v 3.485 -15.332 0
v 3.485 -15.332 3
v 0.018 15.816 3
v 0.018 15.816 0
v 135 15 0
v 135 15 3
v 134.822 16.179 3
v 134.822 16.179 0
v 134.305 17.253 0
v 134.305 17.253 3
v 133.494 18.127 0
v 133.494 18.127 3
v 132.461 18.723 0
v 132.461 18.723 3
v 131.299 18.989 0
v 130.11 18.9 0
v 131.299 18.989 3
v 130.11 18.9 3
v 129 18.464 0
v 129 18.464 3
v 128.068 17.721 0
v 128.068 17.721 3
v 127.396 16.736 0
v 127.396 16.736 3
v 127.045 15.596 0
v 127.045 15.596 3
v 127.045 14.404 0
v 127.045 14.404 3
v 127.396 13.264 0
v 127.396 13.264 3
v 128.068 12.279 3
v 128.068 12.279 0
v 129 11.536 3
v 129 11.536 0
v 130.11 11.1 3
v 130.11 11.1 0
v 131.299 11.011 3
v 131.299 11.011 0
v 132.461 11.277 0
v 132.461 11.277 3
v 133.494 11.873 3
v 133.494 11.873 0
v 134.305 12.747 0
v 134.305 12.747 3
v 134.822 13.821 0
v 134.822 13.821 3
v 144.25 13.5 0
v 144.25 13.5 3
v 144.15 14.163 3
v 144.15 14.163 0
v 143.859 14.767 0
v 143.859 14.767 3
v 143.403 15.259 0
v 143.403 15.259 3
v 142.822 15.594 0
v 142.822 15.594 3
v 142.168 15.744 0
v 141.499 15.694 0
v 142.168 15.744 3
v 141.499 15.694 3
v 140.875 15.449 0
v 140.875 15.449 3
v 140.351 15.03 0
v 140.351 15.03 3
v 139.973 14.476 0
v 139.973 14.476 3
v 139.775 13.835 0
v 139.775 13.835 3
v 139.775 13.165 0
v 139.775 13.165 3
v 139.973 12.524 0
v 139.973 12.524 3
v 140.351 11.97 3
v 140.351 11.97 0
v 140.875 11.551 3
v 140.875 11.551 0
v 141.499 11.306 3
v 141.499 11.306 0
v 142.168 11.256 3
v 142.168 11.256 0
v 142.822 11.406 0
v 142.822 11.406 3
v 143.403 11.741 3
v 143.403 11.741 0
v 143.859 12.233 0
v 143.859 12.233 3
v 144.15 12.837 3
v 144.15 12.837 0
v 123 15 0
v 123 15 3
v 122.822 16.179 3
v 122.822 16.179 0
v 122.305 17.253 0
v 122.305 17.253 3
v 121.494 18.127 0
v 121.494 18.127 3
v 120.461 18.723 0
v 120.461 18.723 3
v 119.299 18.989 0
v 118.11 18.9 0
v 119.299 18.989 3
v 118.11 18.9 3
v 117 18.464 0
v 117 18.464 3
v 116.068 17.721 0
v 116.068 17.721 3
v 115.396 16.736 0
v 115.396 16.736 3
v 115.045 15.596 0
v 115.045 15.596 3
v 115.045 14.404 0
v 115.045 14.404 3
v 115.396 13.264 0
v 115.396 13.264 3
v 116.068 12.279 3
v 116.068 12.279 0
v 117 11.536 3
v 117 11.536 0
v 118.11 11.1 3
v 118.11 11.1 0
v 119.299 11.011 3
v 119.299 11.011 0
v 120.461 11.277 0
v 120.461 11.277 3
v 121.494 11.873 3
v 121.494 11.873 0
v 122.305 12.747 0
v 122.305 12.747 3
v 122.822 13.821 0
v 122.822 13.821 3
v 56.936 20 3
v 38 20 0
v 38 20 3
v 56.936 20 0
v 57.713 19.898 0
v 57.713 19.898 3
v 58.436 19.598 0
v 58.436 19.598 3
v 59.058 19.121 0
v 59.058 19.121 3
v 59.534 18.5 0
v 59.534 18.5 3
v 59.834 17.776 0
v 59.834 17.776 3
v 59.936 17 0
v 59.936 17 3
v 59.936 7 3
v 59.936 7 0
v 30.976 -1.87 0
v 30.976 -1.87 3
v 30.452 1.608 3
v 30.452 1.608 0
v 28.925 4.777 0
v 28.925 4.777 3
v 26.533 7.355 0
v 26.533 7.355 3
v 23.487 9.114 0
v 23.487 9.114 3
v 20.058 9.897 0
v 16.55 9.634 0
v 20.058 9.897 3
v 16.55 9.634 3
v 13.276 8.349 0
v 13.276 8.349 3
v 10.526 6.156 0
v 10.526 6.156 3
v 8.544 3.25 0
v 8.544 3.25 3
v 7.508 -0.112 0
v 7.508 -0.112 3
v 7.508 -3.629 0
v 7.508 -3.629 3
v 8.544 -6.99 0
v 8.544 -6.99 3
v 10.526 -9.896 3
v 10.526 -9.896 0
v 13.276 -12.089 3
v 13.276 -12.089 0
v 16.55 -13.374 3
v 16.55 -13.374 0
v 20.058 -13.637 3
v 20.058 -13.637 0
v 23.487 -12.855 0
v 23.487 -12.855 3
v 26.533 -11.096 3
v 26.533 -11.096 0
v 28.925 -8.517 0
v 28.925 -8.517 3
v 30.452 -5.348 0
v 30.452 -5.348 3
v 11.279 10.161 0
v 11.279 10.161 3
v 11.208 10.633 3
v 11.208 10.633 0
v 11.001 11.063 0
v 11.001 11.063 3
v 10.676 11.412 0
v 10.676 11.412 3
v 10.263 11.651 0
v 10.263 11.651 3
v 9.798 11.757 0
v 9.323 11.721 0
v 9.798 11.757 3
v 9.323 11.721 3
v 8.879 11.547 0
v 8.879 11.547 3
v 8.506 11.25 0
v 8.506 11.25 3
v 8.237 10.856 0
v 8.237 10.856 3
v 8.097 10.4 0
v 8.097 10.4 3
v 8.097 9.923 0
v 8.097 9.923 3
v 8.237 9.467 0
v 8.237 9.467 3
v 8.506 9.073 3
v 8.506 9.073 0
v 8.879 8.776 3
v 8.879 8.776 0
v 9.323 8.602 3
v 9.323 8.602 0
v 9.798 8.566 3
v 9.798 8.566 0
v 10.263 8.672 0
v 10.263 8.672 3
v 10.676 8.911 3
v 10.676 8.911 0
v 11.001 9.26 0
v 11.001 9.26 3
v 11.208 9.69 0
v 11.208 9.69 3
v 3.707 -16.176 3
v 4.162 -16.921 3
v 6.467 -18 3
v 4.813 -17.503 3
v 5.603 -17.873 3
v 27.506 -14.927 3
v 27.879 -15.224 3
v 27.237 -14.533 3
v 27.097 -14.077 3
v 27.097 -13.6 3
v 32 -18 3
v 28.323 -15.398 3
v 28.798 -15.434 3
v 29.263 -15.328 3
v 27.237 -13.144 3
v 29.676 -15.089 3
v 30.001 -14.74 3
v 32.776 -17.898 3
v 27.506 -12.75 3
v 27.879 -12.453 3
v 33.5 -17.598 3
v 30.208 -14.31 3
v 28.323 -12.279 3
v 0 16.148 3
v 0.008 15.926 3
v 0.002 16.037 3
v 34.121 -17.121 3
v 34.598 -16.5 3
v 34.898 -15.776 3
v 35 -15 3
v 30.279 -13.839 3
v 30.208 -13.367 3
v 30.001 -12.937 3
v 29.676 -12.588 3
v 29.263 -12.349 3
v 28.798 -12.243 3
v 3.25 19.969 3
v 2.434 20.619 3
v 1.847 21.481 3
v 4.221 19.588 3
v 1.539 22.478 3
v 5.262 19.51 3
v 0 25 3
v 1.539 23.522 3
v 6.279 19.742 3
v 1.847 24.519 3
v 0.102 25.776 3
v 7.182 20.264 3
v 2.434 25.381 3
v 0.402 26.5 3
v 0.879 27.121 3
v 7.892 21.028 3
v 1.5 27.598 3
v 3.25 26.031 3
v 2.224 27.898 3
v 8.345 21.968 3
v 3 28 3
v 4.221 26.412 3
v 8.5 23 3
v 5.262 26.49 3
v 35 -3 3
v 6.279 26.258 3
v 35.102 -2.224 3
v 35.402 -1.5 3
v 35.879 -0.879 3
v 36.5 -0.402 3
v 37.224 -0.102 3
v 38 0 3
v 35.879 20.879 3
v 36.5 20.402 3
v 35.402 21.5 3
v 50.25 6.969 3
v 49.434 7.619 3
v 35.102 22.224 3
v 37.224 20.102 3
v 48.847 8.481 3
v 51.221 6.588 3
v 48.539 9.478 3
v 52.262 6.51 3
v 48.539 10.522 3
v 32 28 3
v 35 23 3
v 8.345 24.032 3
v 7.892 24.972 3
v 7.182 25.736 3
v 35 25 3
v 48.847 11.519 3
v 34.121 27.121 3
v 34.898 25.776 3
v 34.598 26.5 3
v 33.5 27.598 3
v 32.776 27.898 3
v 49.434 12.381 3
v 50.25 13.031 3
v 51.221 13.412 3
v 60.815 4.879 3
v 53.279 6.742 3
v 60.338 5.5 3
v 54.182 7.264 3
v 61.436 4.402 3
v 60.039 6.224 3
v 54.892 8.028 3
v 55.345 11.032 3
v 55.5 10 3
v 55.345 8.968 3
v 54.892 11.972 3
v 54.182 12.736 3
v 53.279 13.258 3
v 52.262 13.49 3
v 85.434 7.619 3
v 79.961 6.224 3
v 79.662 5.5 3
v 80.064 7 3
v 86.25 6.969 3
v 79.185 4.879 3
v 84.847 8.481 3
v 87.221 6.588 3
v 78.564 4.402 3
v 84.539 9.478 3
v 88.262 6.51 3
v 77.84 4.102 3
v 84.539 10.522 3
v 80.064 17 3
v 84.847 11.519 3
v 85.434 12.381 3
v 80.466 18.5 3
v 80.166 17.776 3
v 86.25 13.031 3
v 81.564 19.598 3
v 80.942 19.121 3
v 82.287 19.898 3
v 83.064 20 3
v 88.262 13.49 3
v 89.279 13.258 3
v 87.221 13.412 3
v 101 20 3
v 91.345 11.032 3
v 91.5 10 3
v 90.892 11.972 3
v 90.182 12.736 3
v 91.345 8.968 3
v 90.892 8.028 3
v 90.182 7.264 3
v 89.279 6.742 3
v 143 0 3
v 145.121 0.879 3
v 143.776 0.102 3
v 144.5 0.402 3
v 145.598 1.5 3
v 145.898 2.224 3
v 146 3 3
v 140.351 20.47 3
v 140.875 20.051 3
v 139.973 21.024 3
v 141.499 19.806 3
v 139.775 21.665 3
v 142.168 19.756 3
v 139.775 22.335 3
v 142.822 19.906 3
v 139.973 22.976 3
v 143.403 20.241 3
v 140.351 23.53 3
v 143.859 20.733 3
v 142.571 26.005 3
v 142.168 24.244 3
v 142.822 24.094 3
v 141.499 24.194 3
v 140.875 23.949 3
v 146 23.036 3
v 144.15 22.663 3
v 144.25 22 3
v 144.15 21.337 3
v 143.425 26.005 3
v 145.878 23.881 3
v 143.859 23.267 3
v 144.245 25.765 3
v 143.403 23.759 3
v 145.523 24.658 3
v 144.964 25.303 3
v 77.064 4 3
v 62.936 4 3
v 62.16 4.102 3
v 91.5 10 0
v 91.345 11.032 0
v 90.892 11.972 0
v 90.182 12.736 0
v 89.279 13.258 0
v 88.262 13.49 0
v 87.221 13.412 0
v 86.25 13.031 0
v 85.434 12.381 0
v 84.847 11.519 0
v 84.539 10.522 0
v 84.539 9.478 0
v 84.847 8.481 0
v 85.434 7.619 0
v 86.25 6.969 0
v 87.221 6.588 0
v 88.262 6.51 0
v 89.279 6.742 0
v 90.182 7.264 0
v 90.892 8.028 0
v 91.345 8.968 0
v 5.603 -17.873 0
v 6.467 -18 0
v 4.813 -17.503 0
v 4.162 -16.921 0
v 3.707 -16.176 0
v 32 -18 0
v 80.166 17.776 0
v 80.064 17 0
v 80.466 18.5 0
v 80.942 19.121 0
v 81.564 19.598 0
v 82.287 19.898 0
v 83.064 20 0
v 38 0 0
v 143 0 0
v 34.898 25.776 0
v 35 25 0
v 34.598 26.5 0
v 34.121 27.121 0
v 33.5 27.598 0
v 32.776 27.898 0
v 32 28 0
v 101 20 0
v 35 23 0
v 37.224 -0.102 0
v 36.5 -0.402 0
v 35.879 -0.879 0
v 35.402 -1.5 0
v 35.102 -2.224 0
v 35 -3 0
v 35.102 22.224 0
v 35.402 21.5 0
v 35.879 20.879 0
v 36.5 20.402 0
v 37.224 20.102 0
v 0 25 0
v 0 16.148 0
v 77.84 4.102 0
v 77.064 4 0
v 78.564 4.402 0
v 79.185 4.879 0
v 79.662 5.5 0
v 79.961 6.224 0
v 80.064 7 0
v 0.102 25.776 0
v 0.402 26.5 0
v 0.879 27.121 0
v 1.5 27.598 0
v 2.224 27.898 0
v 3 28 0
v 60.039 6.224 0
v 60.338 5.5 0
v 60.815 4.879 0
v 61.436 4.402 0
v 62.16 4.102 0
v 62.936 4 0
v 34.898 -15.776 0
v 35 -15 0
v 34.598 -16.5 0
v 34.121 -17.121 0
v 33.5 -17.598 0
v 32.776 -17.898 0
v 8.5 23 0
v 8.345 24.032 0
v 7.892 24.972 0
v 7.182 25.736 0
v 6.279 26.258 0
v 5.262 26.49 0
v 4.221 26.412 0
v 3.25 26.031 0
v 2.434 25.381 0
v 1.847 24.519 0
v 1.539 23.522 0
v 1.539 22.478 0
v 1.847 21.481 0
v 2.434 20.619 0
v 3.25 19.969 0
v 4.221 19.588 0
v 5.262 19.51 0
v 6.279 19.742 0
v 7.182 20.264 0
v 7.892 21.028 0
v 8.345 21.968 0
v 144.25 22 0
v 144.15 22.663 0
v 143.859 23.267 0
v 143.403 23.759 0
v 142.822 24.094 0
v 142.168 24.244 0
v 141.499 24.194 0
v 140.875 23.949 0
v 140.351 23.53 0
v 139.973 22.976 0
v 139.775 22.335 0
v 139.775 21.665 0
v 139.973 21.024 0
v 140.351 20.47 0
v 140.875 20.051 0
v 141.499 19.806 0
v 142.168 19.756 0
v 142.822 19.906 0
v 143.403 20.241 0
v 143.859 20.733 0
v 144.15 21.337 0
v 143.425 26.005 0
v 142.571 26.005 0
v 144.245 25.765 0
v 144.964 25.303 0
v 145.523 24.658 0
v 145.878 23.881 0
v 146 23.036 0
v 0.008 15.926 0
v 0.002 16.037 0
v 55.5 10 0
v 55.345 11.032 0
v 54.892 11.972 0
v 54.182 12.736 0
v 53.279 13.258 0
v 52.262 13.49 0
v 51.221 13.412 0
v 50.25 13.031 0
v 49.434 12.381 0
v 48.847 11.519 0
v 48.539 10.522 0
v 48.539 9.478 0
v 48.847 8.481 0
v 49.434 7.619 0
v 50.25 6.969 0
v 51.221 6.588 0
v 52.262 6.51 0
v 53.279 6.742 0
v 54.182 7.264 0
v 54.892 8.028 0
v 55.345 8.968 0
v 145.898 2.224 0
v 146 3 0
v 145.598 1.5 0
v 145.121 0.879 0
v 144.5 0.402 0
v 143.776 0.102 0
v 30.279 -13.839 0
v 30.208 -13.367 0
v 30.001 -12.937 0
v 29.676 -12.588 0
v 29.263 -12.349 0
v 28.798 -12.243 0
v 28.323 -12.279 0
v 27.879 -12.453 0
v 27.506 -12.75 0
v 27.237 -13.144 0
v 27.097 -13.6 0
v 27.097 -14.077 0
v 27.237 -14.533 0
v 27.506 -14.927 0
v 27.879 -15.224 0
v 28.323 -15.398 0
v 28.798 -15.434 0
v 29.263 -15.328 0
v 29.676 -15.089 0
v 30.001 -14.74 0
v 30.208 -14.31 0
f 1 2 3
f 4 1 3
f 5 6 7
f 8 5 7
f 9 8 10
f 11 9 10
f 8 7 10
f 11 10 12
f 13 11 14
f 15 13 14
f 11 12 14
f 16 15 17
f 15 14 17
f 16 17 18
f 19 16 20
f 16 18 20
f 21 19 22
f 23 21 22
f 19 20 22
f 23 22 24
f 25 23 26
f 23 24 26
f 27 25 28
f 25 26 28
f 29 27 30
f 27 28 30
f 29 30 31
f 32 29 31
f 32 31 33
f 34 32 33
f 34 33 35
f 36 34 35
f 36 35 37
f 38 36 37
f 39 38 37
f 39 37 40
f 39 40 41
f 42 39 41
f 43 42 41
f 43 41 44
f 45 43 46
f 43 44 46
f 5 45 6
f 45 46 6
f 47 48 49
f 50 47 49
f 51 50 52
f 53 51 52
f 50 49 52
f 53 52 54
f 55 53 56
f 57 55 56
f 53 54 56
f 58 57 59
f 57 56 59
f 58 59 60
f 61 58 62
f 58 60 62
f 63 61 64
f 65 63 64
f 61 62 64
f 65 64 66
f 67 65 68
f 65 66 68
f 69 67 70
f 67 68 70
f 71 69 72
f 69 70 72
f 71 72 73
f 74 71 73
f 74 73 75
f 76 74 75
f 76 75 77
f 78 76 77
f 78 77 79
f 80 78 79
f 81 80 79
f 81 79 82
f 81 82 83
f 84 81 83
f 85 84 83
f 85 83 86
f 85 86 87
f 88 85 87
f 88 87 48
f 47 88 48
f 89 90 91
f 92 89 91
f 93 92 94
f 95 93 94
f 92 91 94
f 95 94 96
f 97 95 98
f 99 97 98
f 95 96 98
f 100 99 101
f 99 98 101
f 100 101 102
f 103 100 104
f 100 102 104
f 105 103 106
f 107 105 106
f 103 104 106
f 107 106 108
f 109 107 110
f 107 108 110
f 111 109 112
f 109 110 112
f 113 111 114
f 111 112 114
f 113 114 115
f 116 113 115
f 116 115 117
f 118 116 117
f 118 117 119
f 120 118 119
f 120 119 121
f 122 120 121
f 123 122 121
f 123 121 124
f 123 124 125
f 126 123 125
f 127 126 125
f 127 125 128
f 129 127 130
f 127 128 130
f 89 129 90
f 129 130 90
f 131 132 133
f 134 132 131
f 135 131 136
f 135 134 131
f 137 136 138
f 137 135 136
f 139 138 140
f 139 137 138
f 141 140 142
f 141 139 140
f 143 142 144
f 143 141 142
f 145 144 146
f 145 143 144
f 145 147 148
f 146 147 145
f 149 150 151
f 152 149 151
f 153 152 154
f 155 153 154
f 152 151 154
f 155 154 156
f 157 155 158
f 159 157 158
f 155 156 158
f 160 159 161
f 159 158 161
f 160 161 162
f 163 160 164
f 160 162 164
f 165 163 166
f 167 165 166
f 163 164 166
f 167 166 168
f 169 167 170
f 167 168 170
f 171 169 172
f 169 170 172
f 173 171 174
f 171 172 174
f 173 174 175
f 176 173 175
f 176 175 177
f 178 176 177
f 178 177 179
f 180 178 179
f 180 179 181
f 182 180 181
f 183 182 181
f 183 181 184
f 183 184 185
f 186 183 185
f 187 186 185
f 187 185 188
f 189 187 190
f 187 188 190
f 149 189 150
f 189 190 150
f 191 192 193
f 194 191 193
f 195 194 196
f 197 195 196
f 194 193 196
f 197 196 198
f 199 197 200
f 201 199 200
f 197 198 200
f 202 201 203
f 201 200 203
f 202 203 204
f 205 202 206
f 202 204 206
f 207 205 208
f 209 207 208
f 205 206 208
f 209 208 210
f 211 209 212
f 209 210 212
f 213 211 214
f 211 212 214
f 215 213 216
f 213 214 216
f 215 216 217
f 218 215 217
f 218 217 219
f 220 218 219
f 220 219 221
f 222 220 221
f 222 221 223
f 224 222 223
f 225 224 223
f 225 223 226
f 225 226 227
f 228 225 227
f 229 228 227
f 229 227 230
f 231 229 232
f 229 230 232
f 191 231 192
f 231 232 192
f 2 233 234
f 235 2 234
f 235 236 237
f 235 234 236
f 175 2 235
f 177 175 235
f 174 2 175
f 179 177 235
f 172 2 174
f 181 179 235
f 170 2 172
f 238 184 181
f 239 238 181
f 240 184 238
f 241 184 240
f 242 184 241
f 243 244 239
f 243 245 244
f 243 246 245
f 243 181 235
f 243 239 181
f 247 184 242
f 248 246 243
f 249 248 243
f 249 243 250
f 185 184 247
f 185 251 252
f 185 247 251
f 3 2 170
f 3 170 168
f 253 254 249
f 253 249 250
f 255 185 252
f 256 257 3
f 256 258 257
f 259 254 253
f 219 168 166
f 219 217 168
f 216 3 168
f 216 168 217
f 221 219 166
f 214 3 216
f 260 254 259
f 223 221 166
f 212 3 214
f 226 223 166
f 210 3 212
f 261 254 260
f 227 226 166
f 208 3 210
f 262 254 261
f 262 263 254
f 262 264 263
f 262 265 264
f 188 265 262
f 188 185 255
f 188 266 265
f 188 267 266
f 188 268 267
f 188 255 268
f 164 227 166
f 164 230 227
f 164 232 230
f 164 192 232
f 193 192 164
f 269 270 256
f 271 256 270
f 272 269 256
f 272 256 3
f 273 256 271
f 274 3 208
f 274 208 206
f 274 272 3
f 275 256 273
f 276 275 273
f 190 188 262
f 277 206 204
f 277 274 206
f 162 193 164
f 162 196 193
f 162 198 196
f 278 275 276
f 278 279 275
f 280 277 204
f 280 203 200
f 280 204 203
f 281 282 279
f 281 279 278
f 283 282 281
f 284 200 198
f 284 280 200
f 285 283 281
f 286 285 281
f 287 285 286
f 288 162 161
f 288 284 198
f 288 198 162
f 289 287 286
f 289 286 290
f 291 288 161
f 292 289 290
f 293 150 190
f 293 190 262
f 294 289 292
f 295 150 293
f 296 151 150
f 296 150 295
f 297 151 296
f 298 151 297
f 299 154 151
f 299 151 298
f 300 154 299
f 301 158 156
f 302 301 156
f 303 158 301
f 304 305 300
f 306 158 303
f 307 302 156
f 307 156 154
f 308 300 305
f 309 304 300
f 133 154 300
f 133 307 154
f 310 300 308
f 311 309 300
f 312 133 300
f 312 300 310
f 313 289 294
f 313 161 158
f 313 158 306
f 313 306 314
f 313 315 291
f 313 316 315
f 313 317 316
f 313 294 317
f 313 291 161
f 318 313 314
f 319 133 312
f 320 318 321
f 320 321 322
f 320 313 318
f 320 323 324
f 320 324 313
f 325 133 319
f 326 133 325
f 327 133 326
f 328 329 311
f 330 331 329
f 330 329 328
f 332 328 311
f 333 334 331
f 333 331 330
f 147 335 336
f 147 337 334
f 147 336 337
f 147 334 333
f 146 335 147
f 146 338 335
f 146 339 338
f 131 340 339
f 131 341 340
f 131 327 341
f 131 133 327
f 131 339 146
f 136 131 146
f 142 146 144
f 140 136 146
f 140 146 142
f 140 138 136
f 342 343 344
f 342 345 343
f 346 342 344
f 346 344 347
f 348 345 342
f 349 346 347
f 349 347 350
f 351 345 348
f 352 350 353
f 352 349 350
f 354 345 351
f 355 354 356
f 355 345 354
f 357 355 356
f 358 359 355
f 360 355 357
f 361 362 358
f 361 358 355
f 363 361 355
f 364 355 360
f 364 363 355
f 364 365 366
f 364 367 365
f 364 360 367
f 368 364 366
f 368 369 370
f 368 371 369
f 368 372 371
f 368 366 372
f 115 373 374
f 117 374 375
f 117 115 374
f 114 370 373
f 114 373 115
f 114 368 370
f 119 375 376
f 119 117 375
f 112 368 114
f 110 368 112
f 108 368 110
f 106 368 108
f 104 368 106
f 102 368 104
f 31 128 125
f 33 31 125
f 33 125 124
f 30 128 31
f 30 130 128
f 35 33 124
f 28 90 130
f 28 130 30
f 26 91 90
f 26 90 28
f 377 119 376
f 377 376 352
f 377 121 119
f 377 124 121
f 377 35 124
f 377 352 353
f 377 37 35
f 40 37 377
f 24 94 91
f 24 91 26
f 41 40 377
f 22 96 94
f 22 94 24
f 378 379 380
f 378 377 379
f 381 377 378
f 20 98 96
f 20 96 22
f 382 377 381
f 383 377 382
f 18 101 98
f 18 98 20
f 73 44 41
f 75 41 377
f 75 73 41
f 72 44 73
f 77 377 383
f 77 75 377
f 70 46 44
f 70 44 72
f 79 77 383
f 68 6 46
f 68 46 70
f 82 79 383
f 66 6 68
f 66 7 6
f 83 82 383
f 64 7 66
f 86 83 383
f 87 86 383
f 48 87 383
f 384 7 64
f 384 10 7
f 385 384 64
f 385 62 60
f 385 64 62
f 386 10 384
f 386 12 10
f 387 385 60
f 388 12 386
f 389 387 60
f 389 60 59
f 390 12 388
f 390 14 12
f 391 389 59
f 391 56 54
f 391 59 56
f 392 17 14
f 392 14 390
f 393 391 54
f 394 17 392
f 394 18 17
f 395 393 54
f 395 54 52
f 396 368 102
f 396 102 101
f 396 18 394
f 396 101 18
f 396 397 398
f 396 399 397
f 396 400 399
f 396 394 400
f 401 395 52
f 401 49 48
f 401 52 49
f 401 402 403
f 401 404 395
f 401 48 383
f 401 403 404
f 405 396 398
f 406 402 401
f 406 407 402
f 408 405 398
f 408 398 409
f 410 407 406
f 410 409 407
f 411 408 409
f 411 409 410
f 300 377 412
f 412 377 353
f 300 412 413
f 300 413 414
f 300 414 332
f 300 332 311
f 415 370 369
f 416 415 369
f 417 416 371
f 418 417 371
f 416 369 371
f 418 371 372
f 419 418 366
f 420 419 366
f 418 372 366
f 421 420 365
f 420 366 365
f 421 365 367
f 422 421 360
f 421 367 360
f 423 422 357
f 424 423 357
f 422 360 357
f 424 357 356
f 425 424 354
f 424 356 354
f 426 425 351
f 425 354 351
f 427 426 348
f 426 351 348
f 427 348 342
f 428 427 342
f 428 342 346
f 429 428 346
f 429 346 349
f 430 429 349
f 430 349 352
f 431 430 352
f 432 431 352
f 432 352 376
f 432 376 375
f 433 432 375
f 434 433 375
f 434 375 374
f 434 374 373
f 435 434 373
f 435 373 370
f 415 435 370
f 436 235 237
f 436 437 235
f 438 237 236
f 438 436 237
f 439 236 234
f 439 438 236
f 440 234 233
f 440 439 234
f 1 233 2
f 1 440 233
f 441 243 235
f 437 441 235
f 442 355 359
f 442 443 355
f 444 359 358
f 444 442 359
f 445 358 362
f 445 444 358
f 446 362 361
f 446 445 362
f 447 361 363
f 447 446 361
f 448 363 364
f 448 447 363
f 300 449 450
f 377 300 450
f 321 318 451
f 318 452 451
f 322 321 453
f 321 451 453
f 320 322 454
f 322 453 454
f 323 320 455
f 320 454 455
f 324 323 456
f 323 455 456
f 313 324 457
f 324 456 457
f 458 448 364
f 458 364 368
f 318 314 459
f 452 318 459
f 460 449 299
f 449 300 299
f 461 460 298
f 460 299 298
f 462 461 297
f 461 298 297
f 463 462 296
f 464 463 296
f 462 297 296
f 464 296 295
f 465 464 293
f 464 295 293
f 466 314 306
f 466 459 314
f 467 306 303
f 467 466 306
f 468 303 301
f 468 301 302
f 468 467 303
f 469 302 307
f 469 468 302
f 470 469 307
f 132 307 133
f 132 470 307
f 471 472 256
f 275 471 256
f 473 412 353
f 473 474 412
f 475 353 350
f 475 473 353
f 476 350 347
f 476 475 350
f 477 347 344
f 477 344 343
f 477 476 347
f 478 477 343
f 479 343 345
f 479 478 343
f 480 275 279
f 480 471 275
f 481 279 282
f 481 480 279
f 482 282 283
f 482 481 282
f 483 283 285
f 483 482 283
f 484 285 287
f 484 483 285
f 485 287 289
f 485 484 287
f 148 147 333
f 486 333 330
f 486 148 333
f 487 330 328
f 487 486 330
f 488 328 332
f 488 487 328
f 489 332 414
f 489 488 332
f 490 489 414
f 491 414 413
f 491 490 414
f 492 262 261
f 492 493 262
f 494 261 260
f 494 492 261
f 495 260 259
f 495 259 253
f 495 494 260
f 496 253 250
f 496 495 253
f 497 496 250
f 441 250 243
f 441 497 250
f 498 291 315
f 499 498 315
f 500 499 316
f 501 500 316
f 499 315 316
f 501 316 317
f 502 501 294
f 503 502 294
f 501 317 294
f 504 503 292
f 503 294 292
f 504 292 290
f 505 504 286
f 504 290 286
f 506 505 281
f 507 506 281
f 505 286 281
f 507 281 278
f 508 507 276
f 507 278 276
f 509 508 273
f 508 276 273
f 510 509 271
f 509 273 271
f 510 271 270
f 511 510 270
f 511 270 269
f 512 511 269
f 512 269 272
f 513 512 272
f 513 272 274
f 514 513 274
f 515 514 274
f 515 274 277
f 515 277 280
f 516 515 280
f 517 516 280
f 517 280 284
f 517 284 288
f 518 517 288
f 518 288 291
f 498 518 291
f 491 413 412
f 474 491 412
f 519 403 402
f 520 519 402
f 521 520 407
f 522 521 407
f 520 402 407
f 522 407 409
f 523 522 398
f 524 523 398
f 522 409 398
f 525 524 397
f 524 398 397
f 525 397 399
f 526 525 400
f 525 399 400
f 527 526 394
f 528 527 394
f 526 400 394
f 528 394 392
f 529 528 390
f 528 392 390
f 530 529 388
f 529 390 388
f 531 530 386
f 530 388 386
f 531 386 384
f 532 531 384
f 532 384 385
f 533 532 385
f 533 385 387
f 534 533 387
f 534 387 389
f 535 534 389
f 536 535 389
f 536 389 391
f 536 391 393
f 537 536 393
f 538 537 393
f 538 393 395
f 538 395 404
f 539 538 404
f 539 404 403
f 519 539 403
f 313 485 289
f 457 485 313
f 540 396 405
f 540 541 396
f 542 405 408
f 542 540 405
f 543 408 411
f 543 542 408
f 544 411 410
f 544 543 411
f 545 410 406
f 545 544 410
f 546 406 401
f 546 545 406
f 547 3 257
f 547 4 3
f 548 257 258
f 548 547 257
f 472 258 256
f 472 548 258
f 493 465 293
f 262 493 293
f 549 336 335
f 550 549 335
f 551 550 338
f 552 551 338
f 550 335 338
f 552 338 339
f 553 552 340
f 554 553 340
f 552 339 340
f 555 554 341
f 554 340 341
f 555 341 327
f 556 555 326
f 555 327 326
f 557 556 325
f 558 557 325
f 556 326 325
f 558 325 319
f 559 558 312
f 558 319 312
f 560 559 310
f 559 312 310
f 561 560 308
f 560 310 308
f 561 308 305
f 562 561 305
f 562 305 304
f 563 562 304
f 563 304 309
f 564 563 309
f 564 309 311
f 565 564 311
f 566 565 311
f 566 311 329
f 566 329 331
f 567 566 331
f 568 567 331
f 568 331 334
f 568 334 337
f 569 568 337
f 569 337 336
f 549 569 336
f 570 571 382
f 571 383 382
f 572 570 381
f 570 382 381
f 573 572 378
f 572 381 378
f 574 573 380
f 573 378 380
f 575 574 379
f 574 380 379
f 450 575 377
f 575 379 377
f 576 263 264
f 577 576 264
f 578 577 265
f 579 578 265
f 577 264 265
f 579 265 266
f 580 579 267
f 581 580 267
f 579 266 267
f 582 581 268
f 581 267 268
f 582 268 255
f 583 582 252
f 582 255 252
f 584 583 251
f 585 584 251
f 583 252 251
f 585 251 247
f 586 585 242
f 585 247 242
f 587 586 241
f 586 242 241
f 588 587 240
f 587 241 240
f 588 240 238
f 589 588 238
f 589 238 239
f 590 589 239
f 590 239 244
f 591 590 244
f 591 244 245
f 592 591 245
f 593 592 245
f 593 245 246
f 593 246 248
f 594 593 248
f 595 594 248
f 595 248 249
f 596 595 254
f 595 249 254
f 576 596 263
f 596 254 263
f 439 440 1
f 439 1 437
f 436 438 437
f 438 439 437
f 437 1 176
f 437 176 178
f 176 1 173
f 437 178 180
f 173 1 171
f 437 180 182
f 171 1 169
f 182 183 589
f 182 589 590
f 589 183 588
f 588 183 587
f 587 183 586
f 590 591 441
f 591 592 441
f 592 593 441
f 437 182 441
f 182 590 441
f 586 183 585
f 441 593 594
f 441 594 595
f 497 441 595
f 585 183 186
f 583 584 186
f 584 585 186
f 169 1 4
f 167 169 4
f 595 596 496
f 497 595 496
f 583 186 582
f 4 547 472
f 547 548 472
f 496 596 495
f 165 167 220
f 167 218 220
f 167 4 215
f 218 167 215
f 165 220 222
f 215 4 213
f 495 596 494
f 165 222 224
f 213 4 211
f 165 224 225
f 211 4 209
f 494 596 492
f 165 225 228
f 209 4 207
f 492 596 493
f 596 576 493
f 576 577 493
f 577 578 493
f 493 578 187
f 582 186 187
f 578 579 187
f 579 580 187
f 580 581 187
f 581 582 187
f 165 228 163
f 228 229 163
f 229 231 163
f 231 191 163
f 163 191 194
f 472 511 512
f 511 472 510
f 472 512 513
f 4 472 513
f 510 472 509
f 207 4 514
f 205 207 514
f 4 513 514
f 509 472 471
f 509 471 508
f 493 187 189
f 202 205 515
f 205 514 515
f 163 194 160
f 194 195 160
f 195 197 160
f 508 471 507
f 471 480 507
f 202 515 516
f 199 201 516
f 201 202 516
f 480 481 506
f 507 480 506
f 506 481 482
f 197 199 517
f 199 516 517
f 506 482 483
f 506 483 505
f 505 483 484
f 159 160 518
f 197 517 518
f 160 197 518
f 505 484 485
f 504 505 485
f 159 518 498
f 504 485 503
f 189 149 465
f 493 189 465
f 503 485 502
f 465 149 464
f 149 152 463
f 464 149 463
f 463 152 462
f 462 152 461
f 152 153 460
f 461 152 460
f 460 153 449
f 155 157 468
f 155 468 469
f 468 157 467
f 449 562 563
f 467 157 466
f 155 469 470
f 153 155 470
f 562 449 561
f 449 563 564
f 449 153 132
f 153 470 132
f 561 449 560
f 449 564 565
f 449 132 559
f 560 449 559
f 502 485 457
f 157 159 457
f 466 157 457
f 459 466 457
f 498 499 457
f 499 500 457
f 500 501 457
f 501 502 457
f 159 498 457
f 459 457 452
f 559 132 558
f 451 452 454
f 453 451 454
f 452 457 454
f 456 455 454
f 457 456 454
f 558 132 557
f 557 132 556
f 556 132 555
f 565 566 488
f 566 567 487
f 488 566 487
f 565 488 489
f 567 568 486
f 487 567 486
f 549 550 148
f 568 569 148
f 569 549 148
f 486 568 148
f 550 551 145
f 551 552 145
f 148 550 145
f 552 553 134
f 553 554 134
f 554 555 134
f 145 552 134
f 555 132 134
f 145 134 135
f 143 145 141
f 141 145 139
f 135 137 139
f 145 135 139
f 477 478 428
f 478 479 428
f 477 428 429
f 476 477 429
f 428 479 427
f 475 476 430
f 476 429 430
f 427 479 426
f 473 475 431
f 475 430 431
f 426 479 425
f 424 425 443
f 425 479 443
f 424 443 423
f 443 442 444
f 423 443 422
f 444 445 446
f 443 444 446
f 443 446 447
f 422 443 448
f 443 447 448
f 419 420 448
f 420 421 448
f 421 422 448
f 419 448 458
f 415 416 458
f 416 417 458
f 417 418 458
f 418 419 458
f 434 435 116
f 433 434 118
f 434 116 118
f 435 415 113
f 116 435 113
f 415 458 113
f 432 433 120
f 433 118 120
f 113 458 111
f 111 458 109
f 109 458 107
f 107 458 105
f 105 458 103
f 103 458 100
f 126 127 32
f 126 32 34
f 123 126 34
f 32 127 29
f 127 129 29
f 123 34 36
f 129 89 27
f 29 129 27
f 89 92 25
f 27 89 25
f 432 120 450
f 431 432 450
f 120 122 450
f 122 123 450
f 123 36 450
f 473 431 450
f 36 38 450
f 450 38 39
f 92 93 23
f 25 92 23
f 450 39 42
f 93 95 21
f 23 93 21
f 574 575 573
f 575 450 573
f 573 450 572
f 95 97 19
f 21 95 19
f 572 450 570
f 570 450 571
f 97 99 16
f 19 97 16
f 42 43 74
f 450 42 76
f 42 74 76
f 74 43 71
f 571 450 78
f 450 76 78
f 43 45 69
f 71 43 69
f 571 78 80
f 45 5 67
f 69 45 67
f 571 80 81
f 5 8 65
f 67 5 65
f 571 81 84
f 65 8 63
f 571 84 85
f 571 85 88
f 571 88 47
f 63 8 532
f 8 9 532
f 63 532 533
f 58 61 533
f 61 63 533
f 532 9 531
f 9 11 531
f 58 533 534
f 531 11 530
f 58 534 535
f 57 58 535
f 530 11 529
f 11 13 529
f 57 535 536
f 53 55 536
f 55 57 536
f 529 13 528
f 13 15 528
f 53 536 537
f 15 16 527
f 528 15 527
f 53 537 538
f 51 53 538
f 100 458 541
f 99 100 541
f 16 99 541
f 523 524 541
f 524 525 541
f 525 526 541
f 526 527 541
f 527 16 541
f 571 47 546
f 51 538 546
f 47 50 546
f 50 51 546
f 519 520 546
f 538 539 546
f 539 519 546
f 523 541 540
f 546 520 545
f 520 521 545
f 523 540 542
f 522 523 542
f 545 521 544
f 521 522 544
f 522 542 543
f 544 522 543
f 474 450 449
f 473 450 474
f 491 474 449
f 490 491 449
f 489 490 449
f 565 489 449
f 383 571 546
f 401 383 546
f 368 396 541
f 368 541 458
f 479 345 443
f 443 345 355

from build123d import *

# Parameters (mm, degrees)
ESQUISSE1_W              = 146
ESQUISSE1_H              = 20
BOSS_EXTRU_1_DEPTH       = 3
ESQUISSE2_R              = 3.5
ENL_V_MAT_EXTRU_3_DEPTH  = 4
ESQUISSE6_W              = 35
ESQUISSE6_H              = 3
BOSS_EXTRU_3_DEPTH       = 8
ESQUISSE8_R              = 3.5
ENL_V_MAT_EXTRU_4_DEPTH  = 8
ESQUISSE7_W              = 35
ESQUISSE7_H              = 3
BOSS_EXTRU_4_DEPTH       = 24
CONG_2_R                 = 3
ESQUISSE10_W             = 20.127249292
ESQUISSE10_H             = 16
ENL_V_MAT_EXTRU_5_DEPTH  = 24
CONG_3_R                 = 3
BOSS_EXTRU_5_DEPTH       = 3
ESQUISSE13_R             = 2.25
ENL_V_MAT_EXTRU_6_DEPTH  = 24
CONG_4_R                 = 3
ESQUISSE16_R             = 11.8
ESQUISSE16_R_2           = 1.6
ENL_V_MAT_EXTRU_7_DEPTH  = 3
ENL_V_MAT_EXTRU_11_DEPTH = 3
CONG_10_R                = 3
ESQUISSE18_R             = 4
ENL_V_MAT_EXTRU_12_DEPTH = 3


with BuildPart() as part:
    # Esquisse1 → Boss.-Extru.1 (new body)
    with BuildSketch(Plane.XY):
        with Locations((73, 10)):
            Rectangle(ESQUISSE1_W, ESQUISSE1_H)
    extrude(amount=BOSS_EXTRU_1_DEPTH)

    # Esquisse2 → Enlèv. mat.-Extru.3 (cut, through all)
    with BuildSketch(Plane.XY.offset(3)):
        with Locations((52, 10)):
            Circle(ESQUISSE2_R)
        with Locations((88, 10)):
            Circle(ESQUISSE2_R)
    extrude(amount=-ENL_V_MAT_EXTRU_3_DEPTH, mode=Mode.SUBTRACT)

    # Esquisse6 → Boss.-Extru.3 (add)
    with BuildSketch(Plane(origin=(0, 20, 0), x_dir=(1, 0, 0), z_dir=(0, 1, 0))):
        with Locations((17.5, -1.5)):
            Rectangle(ESQUISSE6_W, ESQUISSE6_H)
    extrude(amount=BOSS_EXTRU_3_DEPTH)

    # Esquisse8 → Enlèv. mat.-Extru.4 (cut)
    with BuildSketch(Plane.XY.offset(3)):
        with Locations((5, 23)):
            Circle(ESQUISSE8_R)
    extrude(amount=-ENL_V_MAT_EXTRU_4_DEPTH, mode=Mode.SUBTRACT)

    # Esquisse7 → Boss.-Extru.4 (add)
    with BuildSketch(Plane.XZ):
        with Locations((17.5, 1.5)):
            Rectangle(ESQUISSE7_W, ESQUISSE7_H)
    extrude(amount=BOSS_EXTRU_4_DEPTH)

    # Congé2
    cong_2_edges = [part.edges().sort_by_distance(p)[0] for p in [
        (35, 20, 1.5),
        (0, 28, 1.5),
        (35, 28, 1.5),
        (35, -24, 1.5),
        (0, -24, 1.5),
        (35, 0, 1.5),
        (146, 20, 1.5),
        (146, 0, 1.5),
    ]]
    fillet(cong_2_edges, radius=CONG_2_R)

    # Esquisse10 → Enlèv. mat.-Extru.5 (cut)
    with BuildSketch(Plane.XY.offset(3)):
        with Locations((70, 12)):
            Rectangle(ESQUISSE10_W, ESQUISSE10_H)
    extrude(amount=-ENL_V_MAT_EXTRU_5_DEPTH, mode=Mode.SUBTRACT)

    # Congé3
    cong_3_edges = [part.edges().sort_by_distance(p)[0] for p in [
        (80.063624646, 20, 1.5),
        (80.063624646, 4, 1.5),
        (59.936375354, 4, 1.5),
        (59.936375354, 20, 1.5),
    ]]
    fillet(cong_3_edges, radius=CONG_3_R)

    # Esquisse14 → Boss.-Extru.5 (add)
    with BuildSketch(Plane.XY.offset(3)):
        Polygon((146, 10), (146, 26.5), (101, 20), align=None)
    extrude(amount=-BOSS_EXTRU_5_DEPTH)

    # Esquisse13 → Enlèv. mat.-Extru.6 (cut)
    with BuildSketch(Plane.XY.offset(3)):
        with Locations((142, 22)):
            Circle(ESQUISSE13_R)
        with Locations((142, 13.5)):
            Circle(ESQUISSE13_R)
    extrude(amount=-ENL_V_MAT_EXTRU_6_DEPTH, mode=Mode.SUBTRACT)

    # Congé4
    cong_4_edges = [part.edges().sort_by_distance(p)[0] for p in [
        (146, 26.5, 1.5),
    ]]
    fillet(cong_4_edges, radius=CONG_4_R)

    # Esquisse16 → Enlèv. mat.-Extru.7 (cut)
    with BuildSketch(Plane.XY.offset(3)):
        with Locations((19.17587198, -1.870199746)):
            Circle(ESQUISSE16_R)
        with Locations((9.678696735, 10.161451621)):
            Circle(ESQUISSE16_R_2)
        with Locations((28.678696735, -13.838548379)):
            Circle(ESQUISSE16_R_2)
    extrude(amount=-ENL_V_MAT_EXTRU_7_DEPTH, mode=Mode.SUBTRACT)

    # Esquisse17 → Enlèv. mat.-Extru.11 (cut)
    with BuildSketch(Plane.XY.offset(3)):
        Polygon((35, -18), (3.782330551, -18), (0, 15.981074218), (0, -26.941472008), (35, -26.941472008), align=None)
    extrude(amount=-ENL_V_MAT_EXTRU_11_DEPTH, mode=Mode.SUBTRACT)

    # Congé10
    cong_10_edges = [part.edges().sort_by_distance(p)[0] for p in [
        (35, -18, 1.5),
        (0, 15.981074218, 1.5),
        (3.782330551, -18, 1.5),
    ]]
    fillet(cong_10_edges, radius=CONG_10_R)

    # Esquisse18 → Enlèv. mat.-Extru.12 (cut)
    with BuildSketch(Plane.XY.offset(3)):
        with Locations((131, 15)):
            Circle(ESQUISSE18_R)
        with Locations((119, 15)):
            Circle(ESQUISSE18_R)
    extrude(amount=-ENL_V_MAT_EXTRU_12_DEPTH, mode=Mode.SUBTRACT)


solid = part.part
